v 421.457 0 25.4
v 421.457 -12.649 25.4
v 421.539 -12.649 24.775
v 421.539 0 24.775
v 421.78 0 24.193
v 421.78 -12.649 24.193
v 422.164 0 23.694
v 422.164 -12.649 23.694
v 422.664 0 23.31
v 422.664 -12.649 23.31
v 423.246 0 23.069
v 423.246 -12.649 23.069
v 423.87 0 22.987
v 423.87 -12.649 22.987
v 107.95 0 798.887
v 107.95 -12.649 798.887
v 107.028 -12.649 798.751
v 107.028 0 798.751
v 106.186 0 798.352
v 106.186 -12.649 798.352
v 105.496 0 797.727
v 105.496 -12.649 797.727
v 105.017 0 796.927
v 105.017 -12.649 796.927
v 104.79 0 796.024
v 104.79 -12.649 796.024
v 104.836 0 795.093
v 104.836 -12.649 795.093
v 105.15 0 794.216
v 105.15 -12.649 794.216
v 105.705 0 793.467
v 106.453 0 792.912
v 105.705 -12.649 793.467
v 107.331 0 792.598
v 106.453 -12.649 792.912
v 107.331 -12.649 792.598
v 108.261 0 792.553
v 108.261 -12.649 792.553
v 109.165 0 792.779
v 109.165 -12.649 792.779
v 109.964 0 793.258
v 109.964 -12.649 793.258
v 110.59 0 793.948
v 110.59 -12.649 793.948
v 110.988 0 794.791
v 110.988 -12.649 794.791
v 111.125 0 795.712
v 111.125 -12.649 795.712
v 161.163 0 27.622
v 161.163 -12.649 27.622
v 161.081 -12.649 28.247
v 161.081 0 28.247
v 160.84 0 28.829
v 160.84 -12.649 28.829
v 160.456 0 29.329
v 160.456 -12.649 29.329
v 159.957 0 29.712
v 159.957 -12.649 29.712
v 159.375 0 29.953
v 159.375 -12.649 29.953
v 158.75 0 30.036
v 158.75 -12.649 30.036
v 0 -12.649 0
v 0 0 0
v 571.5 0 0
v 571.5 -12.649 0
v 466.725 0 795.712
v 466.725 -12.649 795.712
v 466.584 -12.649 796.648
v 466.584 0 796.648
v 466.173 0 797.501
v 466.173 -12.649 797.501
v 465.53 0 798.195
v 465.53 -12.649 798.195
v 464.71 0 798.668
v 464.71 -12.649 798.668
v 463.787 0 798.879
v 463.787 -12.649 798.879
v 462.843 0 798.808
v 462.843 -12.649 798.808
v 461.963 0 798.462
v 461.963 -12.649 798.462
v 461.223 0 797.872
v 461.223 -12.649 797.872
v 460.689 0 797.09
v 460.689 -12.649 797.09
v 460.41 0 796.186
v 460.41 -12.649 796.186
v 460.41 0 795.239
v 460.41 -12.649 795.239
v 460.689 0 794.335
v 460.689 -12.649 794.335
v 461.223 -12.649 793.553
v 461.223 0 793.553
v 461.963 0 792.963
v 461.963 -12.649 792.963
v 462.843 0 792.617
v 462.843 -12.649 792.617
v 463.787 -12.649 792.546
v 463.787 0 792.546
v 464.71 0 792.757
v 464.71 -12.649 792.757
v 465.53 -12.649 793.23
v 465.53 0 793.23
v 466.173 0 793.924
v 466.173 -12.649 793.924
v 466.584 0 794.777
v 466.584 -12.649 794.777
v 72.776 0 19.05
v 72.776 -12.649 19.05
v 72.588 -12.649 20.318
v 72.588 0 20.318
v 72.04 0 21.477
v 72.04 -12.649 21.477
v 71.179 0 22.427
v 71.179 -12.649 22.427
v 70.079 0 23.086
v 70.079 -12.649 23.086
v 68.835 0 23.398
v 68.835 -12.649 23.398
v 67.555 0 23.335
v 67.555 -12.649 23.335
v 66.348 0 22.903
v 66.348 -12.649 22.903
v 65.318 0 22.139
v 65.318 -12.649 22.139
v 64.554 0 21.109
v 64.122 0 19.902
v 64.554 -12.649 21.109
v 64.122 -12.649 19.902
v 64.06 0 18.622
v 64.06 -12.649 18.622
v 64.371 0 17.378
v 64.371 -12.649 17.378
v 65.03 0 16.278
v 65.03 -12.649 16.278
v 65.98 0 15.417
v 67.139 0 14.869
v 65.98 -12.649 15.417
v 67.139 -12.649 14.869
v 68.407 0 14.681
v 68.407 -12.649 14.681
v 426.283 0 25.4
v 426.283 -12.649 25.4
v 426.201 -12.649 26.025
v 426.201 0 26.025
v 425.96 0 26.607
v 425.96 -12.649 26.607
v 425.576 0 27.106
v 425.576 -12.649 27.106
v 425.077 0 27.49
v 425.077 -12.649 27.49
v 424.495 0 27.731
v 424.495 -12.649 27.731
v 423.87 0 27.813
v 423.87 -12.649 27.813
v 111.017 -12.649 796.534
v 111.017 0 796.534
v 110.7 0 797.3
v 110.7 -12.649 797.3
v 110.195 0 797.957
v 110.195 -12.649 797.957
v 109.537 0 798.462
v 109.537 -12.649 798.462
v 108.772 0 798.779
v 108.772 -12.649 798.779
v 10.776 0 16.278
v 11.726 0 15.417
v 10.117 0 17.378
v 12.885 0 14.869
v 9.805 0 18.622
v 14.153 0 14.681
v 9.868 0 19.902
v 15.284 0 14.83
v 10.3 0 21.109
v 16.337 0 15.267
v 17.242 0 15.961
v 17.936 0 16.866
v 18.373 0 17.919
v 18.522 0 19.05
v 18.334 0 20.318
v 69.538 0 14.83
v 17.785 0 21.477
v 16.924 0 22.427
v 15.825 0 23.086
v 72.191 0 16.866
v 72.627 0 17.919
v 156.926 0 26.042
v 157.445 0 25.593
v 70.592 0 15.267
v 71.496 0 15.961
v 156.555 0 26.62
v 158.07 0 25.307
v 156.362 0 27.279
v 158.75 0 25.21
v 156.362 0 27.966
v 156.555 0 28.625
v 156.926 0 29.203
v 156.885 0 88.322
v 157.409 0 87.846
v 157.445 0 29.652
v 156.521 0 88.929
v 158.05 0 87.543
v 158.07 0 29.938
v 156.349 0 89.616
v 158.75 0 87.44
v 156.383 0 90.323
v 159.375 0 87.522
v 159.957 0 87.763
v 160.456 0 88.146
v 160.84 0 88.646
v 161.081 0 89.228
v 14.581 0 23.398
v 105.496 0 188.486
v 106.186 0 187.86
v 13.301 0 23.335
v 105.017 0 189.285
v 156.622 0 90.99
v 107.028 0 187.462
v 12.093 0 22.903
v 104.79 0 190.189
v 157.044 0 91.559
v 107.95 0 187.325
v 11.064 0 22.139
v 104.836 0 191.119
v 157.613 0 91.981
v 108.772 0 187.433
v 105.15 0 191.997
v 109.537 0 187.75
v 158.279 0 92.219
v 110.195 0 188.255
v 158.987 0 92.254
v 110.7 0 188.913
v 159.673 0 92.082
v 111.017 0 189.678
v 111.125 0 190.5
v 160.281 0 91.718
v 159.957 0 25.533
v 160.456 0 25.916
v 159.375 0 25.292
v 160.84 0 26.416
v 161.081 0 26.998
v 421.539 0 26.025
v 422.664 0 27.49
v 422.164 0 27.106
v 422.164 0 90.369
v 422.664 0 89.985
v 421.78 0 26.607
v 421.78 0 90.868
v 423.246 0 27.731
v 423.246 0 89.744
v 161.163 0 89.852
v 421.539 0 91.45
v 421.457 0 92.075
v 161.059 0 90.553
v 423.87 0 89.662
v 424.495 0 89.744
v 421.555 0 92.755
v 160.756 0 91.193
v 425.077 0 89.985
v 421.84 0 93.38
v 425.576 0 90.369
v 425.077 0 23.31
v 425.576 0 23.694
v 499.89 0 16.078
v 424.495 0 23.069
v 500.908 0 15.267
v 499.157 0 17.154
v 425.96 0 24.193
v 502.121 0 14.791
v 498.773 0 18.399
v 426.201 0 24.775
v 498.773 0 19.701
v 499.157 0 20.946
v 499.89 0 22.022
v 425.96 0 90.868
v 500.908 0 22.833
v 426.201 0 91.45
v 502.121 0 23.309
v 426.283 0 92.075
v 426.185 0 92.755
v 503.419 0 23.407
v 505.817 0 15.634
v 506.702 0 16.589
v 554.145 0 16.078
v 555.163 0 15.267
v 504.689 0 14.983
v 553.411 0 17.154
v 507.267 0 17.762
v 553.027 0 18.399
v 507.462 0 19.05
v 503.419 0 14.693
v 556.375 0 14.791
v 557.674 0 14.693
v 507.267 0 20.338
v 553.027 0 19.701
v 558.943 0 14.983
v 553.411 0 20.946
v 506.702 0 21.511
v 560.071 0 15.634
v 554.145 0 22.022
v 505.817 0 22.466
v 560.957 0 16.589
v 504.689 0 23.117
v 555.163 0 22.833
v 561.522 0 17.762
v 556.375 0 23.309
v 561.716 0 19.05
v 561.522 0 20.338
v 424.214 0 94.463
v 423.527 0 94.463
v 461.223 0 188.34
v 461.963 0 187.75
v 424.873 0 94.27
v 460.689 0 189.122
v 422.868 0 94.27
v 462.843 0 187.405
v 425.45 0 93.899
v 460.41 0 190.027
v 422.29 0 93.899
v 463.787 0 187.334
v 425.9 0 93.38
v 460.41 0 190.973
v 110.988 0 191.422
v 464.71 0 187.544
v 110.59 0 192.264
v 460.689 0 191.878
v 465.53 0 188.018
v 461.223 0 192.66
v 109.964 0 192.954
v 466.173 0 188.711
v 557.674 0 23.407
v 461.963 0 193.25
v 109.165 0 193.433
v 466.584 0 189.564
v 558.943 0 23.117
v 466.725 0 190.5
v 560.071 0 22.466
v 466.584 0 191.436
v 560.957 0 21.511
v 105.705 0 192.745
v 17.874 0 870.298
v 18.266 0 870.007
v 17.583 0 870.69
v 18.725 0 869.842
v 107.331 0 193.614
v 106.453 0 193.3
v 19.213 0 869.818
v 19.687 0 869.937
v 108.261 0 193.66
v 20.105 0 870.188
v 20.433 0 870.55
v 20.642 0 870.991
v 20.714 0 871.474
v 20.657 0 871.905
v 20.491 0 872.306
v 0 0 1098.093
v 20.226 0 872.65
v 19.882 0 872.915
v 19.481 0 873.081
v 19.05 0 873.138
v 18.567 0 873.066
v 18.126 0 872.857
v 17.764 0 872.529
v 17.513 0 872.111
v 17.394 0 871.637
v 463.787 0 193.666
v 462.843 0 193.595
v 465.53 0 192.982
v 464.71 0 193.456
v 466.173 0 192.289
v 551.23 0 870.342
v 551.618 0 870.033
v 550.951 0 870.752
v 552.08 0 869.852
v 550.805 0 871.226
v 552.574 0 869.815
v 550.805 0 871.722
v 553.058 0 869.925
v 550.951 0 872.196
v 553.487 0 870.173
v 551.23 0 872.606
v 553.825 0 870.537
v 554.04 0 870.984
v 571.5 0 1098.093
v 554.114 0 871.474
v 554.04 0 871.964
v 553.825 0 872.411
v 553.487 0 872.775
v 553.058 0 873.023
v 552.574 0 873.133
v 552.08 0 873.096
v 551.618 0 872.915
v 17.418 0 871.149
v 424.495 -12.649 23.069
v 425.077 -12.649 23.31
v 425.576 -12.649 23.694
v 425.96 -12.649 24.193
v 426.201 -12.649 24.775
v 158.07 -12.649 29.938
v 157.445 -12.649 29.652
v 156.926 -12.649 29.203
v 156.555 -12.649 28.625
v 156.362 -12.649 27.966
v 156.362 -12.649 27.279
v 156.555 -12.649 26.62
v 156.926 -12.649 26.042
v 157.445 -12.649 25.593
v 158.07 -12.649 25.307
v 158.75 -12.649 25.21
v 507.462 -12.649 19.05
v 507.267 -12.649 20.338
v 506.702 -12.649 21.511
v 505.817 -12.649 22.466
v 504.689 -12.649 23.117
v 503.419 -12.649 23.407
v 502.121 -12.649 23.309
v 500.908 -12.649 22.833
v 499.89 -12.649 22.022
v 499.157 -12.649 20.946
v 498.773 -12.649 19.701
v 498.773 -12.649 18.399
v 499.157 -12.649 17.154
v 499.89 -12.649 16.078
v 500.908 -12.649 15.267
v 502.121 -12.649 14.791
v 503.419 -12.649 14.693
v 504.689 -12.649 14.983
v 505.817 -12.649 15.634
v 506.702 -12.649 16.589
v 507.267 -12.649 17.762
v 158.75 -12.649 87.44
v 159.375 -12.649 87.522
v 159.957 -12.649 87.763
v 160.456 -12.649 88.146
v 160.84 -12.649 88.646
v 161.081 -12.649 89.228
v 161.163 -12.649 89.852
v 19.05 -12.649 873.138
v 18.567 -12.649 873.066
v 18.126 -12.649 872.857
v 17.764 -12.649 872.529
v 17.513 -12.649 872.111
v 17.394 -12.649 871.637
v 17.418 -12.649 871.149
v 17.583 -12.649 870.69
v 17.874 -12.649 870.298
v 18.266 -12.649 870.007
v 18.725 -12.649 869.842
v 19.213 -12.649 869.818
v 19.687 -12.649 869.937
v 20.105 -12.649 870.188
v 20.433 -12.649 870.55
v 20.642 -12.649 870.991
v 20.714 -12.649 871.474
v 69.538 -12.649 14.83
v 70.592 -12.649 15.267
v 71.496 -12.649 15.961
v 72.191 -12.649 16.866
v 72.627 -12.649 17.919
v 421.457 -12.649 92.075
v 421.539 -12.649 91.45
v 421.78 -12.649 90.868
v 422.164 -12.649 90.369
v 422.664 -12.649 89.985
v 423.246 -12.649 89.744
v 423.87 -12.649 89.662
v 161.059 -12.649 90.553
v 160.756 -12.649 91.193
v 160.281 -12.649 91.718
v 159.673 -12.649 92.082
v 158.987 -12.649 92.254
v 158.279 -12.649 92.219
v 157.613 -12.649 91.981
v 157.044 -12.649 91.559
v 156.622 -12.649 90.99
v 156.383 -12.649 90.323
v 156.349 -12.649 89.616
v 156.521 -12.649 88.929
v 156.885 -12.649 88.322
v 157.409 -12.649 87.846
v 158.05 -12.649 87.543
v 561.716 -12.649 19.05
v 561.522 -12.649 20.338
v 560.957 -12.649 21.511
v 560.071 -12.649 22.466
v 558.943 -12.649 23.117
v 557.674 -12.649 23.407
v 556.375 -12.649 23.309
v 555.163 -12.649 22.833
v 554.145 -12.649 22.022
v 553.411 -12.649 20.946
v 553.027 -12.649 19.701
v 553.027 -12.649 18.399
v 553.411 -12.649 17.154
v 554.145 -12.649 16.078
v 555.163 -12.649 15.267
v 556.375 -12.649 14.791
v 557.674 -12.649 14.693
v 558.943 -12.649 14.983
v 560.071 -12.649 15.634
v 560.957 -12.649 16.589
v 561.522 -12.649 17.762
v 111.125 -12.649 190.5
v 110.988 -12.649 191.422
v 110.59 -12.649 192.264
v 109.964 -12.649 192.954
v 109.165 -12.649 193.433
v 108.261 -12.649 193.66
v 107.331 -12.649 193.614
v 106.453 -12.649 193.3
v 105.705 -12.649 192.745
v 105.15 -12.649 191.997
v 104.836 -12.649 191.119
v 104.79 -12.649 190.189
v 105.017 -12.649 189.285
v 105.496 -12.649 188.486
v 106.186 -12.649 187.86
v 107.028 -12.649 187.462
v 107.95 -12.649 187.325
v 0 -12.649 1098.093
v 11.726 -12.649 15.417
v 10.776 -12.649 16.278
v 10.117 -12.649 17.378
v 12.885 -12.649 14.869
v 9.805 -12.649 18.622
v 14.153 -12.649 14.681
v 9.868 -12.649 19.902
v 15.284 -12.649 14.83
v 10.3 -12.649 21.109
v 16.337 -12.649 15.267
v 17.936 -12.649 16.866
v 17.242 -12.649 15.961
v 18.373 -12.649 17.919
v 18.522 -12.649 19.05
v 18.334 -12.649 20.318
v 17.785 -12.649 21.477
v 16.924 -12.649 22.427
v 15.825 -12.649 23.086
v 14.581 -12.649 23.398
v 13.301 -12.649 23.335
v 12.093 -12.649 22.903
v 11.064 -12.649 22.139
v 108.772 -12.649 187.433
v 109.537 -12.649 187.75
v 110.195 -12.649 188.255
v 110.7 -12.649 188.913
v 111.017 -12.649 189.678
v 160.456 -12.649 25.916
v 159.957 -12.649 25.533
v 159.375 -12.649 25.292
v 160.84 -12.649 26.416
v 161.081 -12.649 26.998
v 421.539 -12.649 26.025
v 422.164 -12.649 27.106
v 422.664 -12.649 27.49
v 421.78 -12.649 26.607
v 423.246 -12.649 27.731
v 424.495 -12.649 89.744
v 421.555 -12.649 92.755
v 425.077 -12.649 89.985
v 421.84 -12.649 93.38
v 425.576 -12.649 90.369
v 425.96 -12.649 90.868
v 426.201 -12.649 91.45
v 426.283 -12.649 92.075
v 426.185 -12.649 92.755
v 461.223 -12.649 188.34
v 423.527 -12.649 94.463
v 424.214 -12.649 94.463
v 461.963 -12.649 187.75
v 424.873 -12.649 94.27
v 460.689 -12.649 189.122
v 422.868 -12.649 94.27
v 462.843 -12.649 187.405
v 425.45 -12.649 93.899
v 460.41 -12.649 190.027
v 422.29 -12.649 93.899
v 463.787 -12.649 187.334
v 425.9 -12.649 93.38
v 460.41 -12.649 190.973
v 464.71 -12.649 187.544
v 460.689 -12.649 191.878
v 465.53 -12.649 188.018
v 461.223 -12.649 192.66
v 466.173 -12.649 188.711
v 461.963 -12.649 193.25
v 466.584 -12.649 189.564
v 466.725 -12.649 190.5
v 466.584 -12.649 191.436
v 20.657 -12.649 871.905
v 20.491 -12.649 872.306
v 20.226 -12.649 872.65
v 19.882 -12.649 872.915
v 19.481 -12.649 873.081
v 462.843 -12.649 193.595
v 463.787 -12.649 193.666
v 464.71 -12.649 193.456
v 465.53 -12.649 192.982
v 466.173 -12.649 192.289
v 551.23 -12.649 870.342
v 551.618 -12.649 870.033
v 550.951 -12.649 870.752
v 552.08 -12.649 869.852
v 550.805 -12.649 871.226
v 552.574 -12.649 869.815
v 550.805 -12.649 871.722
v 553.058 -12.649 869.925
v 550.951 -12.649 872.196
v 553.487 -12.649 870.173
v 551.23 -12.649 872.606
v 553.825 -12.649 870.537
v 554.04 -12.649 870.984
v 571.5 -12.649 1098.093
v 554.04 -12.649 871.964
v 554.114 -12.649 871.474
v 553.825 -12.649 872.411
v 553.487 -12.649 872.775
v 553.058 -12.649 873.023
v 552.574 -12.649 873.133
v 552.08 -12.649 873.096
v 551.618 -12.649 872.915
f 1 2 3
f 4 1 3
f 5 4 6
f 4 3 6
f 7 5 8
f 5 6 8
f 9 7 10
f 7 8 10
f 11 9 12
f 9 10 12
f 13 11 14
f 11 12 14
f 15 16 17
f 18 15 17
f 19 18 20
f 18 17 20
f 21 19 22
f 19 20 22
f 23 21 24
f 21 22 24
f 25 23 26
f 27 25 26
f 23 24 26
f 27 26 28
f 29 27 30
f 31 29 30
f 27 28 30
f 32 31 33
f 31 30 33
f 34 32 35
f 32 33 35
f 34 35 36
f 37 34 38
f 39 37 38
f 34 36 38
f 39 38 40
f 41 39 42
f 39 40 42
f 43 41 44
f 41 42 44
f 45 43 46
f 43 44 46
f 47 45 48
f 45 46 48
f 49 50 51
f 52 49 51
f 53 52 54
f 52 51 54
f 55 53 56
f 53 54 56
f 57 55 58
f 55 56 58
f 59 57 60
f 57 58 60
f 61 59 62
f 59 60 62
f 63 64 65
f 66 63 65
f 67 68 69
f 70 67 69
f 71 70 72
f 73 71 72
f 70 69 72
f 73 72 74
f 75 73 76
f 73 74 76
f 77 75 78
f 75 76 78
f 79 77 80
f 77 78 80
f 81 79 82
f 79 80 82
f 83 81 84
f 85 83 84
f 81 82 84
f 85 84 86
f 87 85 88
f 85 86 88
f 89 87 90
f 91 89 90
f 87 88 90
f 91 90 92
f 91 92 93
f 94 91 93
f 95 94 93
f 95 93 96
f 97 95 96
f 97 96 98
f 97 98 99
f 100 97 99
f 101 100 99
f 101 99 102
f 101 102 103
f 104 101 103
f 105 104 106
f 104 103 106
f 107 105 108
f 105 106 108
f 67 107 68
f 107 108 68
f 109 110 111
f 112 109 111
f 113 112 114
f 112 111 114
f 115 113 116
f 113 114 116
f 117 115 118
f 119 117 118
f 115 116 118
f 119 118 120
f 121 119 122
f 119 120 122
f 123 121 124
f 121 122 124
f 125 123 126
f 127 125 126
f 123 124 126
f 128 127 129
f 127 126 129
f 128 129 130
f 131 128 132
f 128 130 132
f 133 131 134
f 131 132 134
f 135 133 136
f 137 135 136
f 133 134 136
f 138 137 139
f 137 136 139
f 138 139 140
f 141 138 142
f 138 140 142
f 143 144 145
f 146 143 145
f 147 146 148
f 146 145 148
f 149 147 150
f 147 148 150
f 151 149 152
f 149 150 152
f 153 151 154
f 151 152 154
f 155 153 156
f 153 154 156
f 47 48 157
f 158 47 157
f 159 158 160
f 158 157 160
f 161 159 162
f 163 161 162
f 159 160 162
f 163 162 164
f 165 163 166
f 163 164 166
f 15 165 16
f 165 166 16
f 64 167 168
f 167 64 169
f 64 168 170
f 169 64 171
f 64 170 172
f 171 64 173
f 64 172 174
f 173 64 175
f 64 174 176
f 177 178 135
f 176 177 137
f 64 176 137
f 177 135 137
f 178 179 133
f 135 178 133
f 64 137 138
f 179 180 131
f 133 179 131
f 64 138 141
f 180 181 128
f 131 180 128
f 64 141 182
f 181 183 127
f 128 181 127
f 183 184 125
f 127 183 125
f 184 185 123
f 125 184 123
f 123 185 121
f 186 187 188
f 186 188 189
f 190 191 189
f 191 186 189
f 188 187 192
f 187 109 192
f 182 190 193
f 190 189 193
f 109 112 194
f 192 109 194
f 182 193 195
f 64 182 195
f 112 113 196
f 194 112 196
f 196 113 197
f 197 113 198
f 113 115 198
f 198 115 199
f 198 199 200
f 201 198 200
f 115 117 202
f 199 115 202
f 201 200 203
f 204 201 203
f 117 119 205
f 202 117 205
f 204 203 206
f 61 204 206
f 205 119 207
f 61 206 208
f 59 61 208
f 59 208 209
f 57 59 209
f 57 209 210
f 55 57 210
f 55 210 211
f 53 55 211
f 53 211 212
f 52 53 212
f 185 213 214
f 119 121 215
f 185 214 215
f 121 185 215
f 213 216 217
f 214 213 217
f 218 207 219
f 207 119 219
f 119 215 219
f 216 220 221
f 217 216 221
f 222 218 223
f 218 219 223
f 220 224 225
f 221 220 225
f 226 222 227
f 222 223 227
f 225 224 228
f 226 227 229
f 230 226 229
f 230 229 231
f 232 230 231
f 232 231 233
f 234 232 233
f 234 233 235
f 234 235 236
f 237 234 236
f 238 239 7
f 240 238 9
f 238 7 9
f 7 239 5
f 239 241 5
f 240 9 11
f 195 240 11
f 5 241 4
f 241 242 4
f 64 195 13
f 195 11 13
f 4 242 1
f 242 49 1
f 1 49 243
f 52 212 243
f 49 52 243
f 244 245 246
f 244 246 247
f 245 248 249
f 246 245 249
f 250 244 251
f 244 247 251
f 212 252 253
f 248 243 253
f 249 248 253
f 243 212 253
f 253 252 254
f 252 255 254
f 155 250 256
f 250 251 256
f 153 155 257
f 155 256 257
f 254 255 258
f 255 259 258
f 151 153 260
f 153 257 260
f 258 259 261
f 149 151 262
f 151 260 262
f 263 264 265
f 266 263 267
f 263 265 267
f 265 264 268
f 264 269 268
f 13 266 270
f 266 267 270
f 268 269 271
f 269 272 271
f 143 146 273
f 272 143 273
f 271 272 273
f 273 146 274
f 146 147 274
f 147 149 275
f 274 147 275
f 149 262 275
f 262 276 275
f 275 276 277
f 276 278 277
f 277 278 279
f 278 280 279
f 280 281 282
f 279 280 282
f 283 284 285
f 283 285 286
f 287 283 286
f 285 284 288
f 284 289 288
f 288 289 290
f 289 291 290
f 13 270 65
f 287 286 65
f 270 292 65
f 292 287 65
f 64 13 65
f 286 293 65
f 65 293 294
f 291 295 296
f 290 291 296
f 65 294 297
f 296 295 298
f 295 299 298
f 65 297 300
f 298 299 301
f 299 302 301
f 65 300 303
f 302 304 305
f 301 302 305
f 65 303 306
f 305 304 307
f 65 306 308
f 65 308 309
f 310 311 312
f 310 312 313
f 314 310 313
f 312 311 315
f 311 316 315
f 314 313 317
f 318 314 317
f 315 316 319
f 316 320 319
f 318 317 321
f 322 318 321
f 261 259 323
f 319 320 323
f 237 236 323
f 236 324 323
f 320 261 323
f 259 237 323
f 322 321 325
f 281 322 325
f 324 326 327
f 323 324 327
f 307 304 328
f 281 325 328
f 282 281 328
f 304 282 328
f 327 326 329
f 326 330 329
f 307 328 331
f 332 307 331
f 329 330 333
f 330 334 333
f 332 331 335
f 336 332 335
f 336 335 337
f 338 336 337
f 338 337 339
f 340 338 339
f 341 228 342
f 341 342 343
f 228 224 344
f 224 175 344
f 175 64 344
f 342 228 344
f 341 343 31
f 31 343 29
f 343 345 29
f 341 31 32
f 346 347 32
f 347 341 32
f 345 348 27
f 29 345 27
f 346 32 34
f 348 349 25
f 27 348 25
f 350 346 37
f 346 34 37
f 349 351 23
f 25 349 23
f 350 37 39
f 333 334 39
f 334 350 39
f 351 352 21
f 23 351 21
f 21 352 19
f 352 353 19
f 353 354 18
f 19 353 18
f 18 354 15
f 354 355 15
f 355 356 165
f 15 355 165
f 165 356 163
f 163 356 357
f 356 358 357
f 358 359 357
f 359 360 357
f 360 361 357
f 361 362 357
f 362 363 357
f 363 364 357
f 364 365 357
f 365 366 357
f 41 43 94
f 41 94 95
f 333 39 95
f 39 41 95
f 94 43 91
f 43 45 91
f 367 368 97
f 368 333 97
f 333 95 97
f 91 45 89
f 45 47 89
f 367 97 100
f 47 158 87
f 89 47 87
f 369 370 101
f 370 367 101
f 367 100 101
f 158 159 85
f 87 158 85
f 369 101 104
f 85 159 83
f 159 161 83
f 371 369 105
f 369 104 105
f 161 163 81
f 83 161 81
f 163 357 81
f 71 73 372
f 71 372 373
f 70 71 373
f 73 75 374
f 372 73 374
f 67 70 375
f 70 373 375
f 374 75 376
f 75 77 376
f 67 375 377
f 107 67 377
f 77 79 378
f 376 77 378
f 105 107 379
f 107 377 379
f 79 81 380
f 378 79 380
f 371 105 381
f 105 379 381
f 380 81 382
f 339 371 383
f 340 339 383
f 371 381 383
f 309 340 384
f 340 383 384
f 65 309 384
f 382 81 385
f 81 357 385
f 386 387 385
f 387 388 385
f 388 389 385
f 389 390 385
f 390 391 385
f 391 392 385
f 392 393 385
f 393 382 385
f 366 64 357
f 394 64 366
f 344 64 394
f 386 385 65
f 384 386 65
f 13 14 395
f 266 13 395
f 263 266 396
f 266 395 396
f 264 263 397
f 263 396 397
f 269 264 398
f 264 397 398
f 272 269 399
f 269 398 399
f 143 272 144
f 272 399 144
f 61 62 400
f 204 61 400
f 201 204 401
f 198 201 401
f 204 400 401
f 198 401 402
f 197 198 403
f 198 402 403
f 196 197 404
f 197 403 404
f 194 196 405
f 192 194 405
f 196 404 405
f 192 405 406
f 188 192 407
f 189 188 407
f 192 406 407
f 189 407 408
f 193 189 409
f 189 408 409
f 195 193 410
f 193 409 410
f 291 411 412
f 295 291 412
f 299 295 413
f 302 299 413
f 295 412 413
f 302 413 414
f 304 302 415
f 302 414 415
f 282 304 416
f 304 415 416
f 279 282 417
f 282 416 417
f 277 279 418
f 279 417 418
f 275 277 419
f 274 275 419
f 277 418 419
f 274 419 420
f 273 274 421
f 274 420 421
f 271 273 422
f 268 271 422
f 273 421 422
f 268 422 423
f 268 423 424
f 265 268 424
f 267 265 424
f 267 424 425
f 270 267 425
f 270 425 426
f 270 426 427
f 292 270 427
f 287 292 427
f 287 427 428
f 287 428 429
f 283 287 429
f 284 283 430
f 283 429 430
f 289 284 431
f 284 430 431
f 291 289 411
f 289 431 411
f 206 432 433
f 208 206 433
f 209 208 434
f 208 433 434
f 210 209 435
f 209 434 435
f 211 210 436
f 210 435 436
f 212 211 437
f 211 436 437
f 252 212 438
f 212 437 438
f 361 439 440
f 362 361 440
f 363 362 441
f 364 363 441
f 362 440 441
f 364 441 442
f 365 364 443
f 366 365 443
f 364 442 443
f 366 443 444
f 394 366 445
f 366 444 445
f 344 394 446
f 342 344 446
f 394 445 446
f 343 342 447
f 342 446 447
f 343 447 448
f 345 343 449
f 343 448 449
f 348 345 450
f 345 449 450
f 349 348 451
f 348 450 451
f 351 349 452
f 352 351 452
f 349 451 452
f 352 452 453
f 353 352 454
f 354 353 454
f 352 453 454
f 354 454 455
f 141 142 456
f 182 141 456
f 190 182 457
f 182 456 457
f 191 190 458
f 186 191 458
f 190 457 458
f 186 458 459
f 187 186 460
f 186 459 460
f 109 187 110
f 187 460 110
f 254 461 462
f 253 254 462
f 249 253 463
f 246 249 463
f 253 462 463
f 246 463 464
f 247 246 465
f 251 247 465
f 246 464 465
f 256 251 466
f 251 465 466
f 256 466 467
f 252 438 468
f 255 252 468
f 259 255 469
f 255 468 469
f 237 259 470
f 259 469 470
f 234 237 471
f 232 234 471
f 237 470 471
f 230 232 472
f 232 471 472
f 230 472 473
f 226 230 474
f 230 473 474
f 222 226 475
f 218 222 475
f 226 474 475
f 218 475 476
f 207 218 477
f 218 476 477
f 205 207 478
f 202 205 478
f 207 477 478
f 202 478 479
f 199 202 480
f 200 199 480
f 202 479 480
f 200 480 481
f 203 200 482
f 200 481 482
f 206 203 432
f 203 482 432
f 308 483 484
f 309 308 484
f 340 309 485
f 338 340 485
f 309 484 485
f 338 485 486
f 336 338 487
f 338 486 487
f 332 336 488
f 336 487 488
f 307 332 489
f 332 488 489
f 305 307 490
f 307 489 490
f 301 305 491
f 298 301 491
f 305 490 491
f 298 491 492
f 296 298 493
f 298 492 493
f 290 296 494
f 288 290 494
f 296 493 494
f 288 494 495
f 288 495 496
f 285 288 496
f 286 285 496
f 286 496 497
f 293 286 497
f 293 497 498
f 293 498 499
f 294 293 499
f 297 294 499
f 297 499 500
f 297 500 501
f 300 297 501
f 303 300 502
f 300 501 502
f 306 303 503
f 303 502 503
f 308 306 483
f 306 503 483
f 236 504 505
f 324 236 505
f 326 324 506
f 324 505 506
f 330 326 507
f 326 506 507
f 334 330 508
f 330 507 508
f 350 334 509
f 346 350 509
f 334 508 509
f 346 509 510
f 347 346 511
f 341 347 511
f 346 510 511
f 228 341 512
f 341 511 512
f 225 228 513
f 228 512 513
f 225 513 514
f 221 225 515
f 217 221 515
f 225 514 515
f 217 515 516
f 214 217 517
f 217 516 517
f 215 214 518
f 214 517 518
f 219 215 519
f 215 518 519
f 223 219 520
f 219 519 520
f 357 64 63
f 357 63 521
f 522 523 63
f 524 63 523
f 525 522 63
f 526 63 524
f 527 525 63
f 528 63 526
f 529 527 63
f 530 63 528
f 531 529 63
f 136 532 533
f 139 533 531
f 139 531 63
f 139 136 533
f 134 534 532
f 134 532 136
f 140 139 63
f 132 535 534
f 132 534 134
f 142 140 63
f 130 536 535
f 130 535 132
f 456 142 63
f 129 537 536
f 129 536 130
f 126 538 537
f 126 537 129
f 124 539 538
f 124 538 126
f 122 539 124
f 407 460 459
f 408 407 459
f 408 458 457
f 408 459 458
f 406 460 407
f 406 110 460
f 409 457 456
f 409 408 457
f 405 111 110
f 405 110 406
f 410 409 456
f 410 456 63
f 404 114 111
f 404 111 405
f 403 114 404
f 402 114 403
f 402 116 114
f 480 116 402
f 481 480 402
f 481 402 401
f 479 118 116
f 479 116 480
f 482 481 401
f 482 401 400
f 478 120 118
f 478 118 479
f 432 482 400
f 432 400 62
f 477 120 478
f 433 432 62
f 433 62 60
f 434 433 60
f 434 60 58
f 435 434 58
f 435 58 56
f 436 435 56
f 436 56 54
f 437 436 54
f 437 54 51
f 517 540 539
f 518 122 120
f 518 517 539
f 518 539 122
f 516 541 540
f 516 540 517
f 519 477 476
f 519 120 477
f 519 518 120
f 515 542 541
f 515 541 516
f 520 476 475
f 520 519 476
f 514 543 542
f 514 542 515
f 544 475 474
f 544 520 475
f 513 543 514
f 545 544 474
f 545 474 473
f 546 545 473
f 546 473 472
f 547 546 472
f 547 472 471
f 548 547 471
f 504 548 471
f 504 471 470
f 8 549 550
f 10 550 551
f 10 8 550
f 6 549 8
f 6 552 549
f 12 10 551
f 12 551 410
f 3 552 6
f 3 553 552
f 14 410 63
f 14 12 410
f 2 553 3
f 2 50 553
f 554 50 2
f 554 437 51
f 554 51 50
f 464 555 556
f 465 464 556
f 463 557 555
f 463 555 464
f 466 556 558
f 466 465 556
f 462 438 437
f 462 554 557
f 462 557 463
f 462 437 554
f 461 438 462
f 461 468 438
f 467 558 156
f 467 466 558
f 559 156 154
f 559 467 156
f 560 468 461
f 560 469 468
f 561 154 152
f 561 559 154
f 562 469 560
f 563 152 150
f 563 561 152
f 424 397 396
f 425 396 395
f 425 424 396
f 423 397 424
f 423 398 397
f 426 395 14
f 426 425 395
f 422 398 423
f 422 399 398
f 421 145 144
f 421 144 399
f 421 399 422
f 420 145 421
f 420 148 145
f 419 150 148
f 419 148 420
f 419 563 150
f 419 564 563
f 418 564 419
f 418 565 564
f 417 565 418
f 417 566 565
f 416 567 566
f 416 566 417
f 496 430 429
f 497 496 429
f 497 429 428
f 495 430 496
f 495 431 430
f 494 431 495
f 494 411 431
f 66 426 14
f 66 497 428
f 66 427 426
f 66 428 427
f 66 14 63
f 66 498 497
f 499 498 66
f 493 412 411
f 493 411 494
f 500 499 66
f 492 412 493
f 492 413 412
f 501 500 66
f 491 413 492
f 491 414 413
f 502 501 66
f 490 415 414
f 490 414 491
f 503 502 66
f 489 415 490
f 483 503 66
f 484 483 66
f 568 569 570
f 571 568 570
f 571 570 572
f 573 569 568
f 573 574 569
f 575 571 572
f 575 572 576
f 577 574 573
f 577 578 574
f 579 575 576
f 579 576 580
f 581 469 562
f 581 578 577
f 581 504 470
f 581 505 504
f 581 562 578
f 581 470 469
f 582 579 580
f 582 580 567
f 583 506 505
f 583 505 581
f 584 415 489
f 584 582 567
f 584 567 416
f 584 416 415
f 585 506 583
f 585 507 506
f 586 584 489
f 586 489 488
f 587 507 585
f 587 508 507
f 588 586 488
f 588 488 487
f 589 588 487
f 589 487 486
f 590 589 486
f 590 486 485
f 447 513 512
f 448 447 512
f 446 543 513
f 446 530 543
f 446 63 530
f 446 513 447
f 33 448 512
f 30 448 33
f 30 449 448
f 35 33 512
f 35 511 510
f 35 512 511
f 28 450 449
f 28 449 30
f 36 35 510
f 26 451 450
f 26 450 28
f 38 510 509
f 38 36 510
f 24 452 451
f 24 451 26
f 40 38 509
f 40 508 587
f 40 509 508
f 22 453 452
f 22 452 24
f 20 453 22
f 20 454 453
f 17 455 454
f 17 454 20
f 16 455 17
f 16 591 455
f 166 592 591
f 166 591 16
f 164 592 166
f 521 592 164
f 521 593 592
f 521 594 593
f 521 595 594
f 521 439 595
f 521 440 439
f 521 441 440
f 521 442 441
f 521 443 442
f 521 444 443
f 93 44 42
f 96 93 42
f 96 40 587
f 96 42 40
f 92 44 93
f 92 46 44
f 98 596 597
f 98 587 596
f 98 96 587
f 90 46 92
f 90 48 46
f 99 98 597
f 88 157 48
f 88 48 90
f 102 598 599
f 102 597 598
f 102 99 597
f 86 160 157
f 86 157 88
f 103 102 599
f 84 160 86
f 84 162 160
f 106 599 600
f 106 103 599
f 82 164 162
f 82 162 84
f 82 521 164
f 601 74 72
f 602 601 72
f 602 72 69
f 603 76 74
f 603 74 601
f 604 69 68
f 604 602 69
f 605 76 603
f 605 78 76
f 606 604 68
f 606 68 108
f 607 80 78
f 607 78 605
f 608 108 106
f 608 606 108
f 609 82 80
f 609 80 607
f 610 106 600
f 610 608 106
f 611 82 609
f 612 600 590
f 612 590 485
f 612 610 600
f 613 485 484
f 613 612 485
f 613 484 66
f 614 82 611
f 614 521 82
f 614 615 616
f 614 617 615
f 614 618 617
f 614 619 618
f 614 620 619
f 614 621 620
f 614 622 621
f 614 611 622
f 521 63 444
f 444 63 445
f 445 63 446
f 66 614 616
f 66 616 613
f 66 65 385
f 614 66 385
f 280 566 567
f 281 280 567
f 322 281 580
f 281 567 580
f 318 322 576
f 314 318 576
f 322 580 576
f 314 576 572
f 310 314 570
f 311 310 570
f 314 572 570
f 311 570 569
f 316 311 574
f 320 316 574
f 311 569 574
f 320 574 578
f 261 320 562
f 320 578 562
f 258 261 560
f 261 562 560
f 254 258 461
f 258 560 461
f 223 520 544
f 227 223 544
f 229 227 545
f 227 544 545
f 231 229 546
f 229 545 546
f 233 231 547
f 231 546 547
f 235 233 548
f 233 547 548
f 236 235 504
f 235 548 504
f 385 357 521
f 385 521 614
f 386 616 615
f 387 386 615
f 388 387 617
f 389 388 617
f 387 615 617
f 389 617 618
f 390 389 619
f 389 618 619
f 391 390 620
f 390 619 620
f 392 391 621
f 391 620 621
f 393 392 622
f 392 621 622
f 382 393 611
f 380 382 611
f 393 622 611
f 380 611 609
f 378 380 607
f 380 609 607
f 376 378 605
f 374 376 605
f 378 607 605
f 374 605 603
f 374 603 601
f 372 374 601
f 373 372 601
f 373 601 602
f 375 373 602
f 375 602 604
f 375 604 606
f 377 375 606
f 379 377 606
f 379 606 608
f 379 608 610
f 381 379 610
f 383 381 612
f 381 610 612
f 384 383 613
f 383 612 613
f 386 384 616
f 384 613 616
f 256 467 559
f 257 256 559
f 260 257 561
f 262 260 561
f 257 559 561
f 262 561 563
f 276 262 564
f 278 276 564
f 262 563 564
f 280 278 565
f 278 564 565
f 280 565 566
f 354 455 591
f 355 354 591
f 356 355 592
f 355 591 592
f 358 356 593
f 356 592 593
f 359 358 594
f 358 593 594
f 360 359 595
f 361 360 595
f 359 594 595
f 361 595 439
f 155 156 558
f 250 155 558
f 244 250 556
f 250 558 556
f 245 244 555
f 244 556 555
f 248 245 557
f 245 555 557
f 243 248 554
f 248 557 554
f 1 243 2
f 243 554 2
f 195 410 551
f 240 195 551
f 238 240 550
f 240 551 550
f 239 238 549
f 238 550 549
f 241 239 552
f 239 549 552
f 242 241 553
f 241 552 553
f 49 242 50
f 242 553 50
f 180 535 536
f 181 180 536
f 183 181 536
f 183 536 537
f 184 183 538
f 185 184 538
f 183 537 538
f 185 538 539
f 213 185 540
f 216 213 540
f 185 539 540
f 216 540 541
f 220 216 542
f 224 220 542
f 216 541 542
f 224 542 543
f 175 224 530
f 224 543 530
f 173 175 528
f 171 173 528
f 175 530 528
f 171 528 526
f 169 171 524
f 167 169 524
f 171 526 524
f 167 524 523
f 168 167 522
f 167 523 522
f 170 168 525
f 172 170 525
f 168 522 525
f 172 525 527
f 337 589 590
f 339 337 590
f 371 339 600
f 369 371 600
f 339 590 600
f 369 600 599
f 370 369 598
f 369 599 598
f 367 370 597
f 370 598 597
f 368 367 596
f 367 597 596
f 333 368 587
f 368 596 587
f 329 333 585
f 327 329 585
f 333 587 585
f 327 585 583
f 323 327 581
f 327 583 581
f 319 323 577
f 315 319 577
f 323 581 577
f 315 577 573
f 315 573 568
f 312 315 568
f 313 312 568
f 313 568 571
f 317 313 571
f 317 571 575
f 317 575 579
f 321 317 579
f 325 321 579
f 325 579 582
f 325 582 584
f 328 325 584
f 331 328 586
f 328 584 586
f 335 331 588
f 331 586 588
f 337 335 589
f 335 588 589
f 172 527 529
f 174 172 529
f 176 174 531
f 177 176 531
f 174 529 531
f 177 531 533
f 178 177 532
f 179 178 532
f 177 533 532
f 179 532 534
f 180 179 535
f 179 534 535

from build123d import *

# Parameters (mm, degrees)
F0_W     = 571.5
F0_H     = 1098.0928
F1_DEPTH = 12.6492
F2_R     = 4.3688
F2_R_2   = 3.175
F2_R_3   = 1.6637
F3_DEPTH = 12.6492


with BuildPart() as f1:
    # F0 (on Front) → F1 (new body)
    with BuildSketch(Plane.XZ):
        with Locations((285.75, 549.0464)):
            Rectangle(F0_W, F0_H)
    extrude(amount=F1_DEPTH)

    # F2 (on face) → F3 (cut)
    with BuildSketch(Plane.XZ.offset(12.6492)):
        with BuildLine():
            ThreePointArc((14.15288, 14.6812), (17.242088, 15.960792), (18.52168, 19.05))
            ThreePointArc((18.52168, 19.05), (11.063672, 22.139208), (14.15288, 14.6812))
        make_face()
        with BuildLine():
            ThreePointArc((72.77608, 19.05), (65.318072, 22.139208), (68.40728, 14.6812))
            ThreePointArc((68.40728, 14.6812), (71.496488, 15.960792), (72.77608, 19.05))
        make_face()
        with BuildLine():
            ThreePointArc((111.125, 190.5), (105.704936, 192.745064), (107.95, 187.325))
            ThreePointArc((107.95, 187.325), (110.195064, 188.254936), (111.125, 190.5))
        make_face()
        with BuildLine():
            ThreePointArc((161.163, 89.8525), (157.043751, 91.558749), (158.75, 87.4395))
            ThreePointArc((158.75, 87.4395), (160.456249, 88.146251), (161.163, 89.8525))
        make_face()
        with BuildLine():
            ThreePointArc((158.75, 30.0355), (156.337, 27.6225), (158.75, 25.2095))
            Line((158.75, 25.2095), (158.75, 27.6225))
            Line((158.75, 27.6225), (158.75, 30.0355))
        make_face()
        with BuildLine():
            Line((158.75, 27.6225), (158.75, 25.2095))
            ThreePointArc((158.75, 25.2095), (160.456249, 25.916251), (161.163, 27.6225))
            ThreePointArc((161.163, 27.6225), (160.456249, 29.328749), (158.75, 30.0355))
            Line((158.75, 30.0355), (158.75, 27.6225))
        make_face()
        with BuildLine():
            ThreePointArc((421.45712, 92.075), (422.163871, 90.368751), (423.87012, 89.662))
            Line((423.87012, 89.662), (423.87012, 92.075))
            Line((423.87012, 92.075), (421.45712, 92.075))
        make_face()
        with BuildLine():
            Line((423.87012, 92.075), (423.87012, 89.662))
            ThreePointArc((423.87012, 89.662), (425.576369, 90.368751), (426.28312, 92.075))
            ThreePointArc((426.28312, 92.075), (423.87012, 94.488), (421.45712, 92.075))
            Line((421.45712, 92.075), (423.87012, 92.075))
        make_face()
        with BuildLine():
            ThreePointArc((421.45712, 25.4), (422.163871, 23.693751), (423.87012, 22.987))
            Line((423.87012, 22.987), (423.87012, 25.4))
            Line((423.87012, 25.4), (421.45712, 25.4))
        make_face()
        with BuildLine():
            Line((423.87012, 25.4), (423.87012, 22.987))
            ThreePointArc((423.87012, 22.987), (425.576369, 23.693751), (426.28312, 25.4))
            ThreePointArc((426.28312, 25.4), (425.576369, 27.106249), (423.87012, 27.813))
            Line((423.87012, 27.813), (423.87012, 25.4))
        make_face()
        with BuildLine():
            ThreePointArc((111.125, 795.712411), (110.195064, 797.957475), (107.95, 798.887411))
            ThreePointArc((107.95, 798.887411), (105.704936, 793.467347), (111.125, 795.712411))
        make_face()
        with BuildLine():
            ThreePointArc((20.7137, 871.474), (20.226414, 872.650414), (19.05, 873.1377))
            ThreePointArc((19.05, 873.1377), (17.873586, 870.297586), (20.7137, 871.474))
        make_face()
        with BuildLine():
            ThreePointArc((423.87012, 27.813), (422.163871, 27.106249), (421.45712, 25.4))
            Line((421.45712, 25.4), (423.87012, 25.4))
            Line((423.87012, 25.4), (423.87012, 27.813))
        make_face()
        with Locations((503.09272, 19.05)):
            Circle(F2_R)
        with Locations((557.34712, 19.05)):
            Circle(F2_R)
        with Locations((463.55, 190.5)):
            Circle(F2_R_2)
        with Locations((463.55, 795.712411)):
            Circle(F2_R_2)
        with Locations((552.45, 871.474)):
            Circle(F2_R_3)
    extrude(amount=-F3_DEPTH, mode=Mode.SUBTRACT)


solid = f1.part
